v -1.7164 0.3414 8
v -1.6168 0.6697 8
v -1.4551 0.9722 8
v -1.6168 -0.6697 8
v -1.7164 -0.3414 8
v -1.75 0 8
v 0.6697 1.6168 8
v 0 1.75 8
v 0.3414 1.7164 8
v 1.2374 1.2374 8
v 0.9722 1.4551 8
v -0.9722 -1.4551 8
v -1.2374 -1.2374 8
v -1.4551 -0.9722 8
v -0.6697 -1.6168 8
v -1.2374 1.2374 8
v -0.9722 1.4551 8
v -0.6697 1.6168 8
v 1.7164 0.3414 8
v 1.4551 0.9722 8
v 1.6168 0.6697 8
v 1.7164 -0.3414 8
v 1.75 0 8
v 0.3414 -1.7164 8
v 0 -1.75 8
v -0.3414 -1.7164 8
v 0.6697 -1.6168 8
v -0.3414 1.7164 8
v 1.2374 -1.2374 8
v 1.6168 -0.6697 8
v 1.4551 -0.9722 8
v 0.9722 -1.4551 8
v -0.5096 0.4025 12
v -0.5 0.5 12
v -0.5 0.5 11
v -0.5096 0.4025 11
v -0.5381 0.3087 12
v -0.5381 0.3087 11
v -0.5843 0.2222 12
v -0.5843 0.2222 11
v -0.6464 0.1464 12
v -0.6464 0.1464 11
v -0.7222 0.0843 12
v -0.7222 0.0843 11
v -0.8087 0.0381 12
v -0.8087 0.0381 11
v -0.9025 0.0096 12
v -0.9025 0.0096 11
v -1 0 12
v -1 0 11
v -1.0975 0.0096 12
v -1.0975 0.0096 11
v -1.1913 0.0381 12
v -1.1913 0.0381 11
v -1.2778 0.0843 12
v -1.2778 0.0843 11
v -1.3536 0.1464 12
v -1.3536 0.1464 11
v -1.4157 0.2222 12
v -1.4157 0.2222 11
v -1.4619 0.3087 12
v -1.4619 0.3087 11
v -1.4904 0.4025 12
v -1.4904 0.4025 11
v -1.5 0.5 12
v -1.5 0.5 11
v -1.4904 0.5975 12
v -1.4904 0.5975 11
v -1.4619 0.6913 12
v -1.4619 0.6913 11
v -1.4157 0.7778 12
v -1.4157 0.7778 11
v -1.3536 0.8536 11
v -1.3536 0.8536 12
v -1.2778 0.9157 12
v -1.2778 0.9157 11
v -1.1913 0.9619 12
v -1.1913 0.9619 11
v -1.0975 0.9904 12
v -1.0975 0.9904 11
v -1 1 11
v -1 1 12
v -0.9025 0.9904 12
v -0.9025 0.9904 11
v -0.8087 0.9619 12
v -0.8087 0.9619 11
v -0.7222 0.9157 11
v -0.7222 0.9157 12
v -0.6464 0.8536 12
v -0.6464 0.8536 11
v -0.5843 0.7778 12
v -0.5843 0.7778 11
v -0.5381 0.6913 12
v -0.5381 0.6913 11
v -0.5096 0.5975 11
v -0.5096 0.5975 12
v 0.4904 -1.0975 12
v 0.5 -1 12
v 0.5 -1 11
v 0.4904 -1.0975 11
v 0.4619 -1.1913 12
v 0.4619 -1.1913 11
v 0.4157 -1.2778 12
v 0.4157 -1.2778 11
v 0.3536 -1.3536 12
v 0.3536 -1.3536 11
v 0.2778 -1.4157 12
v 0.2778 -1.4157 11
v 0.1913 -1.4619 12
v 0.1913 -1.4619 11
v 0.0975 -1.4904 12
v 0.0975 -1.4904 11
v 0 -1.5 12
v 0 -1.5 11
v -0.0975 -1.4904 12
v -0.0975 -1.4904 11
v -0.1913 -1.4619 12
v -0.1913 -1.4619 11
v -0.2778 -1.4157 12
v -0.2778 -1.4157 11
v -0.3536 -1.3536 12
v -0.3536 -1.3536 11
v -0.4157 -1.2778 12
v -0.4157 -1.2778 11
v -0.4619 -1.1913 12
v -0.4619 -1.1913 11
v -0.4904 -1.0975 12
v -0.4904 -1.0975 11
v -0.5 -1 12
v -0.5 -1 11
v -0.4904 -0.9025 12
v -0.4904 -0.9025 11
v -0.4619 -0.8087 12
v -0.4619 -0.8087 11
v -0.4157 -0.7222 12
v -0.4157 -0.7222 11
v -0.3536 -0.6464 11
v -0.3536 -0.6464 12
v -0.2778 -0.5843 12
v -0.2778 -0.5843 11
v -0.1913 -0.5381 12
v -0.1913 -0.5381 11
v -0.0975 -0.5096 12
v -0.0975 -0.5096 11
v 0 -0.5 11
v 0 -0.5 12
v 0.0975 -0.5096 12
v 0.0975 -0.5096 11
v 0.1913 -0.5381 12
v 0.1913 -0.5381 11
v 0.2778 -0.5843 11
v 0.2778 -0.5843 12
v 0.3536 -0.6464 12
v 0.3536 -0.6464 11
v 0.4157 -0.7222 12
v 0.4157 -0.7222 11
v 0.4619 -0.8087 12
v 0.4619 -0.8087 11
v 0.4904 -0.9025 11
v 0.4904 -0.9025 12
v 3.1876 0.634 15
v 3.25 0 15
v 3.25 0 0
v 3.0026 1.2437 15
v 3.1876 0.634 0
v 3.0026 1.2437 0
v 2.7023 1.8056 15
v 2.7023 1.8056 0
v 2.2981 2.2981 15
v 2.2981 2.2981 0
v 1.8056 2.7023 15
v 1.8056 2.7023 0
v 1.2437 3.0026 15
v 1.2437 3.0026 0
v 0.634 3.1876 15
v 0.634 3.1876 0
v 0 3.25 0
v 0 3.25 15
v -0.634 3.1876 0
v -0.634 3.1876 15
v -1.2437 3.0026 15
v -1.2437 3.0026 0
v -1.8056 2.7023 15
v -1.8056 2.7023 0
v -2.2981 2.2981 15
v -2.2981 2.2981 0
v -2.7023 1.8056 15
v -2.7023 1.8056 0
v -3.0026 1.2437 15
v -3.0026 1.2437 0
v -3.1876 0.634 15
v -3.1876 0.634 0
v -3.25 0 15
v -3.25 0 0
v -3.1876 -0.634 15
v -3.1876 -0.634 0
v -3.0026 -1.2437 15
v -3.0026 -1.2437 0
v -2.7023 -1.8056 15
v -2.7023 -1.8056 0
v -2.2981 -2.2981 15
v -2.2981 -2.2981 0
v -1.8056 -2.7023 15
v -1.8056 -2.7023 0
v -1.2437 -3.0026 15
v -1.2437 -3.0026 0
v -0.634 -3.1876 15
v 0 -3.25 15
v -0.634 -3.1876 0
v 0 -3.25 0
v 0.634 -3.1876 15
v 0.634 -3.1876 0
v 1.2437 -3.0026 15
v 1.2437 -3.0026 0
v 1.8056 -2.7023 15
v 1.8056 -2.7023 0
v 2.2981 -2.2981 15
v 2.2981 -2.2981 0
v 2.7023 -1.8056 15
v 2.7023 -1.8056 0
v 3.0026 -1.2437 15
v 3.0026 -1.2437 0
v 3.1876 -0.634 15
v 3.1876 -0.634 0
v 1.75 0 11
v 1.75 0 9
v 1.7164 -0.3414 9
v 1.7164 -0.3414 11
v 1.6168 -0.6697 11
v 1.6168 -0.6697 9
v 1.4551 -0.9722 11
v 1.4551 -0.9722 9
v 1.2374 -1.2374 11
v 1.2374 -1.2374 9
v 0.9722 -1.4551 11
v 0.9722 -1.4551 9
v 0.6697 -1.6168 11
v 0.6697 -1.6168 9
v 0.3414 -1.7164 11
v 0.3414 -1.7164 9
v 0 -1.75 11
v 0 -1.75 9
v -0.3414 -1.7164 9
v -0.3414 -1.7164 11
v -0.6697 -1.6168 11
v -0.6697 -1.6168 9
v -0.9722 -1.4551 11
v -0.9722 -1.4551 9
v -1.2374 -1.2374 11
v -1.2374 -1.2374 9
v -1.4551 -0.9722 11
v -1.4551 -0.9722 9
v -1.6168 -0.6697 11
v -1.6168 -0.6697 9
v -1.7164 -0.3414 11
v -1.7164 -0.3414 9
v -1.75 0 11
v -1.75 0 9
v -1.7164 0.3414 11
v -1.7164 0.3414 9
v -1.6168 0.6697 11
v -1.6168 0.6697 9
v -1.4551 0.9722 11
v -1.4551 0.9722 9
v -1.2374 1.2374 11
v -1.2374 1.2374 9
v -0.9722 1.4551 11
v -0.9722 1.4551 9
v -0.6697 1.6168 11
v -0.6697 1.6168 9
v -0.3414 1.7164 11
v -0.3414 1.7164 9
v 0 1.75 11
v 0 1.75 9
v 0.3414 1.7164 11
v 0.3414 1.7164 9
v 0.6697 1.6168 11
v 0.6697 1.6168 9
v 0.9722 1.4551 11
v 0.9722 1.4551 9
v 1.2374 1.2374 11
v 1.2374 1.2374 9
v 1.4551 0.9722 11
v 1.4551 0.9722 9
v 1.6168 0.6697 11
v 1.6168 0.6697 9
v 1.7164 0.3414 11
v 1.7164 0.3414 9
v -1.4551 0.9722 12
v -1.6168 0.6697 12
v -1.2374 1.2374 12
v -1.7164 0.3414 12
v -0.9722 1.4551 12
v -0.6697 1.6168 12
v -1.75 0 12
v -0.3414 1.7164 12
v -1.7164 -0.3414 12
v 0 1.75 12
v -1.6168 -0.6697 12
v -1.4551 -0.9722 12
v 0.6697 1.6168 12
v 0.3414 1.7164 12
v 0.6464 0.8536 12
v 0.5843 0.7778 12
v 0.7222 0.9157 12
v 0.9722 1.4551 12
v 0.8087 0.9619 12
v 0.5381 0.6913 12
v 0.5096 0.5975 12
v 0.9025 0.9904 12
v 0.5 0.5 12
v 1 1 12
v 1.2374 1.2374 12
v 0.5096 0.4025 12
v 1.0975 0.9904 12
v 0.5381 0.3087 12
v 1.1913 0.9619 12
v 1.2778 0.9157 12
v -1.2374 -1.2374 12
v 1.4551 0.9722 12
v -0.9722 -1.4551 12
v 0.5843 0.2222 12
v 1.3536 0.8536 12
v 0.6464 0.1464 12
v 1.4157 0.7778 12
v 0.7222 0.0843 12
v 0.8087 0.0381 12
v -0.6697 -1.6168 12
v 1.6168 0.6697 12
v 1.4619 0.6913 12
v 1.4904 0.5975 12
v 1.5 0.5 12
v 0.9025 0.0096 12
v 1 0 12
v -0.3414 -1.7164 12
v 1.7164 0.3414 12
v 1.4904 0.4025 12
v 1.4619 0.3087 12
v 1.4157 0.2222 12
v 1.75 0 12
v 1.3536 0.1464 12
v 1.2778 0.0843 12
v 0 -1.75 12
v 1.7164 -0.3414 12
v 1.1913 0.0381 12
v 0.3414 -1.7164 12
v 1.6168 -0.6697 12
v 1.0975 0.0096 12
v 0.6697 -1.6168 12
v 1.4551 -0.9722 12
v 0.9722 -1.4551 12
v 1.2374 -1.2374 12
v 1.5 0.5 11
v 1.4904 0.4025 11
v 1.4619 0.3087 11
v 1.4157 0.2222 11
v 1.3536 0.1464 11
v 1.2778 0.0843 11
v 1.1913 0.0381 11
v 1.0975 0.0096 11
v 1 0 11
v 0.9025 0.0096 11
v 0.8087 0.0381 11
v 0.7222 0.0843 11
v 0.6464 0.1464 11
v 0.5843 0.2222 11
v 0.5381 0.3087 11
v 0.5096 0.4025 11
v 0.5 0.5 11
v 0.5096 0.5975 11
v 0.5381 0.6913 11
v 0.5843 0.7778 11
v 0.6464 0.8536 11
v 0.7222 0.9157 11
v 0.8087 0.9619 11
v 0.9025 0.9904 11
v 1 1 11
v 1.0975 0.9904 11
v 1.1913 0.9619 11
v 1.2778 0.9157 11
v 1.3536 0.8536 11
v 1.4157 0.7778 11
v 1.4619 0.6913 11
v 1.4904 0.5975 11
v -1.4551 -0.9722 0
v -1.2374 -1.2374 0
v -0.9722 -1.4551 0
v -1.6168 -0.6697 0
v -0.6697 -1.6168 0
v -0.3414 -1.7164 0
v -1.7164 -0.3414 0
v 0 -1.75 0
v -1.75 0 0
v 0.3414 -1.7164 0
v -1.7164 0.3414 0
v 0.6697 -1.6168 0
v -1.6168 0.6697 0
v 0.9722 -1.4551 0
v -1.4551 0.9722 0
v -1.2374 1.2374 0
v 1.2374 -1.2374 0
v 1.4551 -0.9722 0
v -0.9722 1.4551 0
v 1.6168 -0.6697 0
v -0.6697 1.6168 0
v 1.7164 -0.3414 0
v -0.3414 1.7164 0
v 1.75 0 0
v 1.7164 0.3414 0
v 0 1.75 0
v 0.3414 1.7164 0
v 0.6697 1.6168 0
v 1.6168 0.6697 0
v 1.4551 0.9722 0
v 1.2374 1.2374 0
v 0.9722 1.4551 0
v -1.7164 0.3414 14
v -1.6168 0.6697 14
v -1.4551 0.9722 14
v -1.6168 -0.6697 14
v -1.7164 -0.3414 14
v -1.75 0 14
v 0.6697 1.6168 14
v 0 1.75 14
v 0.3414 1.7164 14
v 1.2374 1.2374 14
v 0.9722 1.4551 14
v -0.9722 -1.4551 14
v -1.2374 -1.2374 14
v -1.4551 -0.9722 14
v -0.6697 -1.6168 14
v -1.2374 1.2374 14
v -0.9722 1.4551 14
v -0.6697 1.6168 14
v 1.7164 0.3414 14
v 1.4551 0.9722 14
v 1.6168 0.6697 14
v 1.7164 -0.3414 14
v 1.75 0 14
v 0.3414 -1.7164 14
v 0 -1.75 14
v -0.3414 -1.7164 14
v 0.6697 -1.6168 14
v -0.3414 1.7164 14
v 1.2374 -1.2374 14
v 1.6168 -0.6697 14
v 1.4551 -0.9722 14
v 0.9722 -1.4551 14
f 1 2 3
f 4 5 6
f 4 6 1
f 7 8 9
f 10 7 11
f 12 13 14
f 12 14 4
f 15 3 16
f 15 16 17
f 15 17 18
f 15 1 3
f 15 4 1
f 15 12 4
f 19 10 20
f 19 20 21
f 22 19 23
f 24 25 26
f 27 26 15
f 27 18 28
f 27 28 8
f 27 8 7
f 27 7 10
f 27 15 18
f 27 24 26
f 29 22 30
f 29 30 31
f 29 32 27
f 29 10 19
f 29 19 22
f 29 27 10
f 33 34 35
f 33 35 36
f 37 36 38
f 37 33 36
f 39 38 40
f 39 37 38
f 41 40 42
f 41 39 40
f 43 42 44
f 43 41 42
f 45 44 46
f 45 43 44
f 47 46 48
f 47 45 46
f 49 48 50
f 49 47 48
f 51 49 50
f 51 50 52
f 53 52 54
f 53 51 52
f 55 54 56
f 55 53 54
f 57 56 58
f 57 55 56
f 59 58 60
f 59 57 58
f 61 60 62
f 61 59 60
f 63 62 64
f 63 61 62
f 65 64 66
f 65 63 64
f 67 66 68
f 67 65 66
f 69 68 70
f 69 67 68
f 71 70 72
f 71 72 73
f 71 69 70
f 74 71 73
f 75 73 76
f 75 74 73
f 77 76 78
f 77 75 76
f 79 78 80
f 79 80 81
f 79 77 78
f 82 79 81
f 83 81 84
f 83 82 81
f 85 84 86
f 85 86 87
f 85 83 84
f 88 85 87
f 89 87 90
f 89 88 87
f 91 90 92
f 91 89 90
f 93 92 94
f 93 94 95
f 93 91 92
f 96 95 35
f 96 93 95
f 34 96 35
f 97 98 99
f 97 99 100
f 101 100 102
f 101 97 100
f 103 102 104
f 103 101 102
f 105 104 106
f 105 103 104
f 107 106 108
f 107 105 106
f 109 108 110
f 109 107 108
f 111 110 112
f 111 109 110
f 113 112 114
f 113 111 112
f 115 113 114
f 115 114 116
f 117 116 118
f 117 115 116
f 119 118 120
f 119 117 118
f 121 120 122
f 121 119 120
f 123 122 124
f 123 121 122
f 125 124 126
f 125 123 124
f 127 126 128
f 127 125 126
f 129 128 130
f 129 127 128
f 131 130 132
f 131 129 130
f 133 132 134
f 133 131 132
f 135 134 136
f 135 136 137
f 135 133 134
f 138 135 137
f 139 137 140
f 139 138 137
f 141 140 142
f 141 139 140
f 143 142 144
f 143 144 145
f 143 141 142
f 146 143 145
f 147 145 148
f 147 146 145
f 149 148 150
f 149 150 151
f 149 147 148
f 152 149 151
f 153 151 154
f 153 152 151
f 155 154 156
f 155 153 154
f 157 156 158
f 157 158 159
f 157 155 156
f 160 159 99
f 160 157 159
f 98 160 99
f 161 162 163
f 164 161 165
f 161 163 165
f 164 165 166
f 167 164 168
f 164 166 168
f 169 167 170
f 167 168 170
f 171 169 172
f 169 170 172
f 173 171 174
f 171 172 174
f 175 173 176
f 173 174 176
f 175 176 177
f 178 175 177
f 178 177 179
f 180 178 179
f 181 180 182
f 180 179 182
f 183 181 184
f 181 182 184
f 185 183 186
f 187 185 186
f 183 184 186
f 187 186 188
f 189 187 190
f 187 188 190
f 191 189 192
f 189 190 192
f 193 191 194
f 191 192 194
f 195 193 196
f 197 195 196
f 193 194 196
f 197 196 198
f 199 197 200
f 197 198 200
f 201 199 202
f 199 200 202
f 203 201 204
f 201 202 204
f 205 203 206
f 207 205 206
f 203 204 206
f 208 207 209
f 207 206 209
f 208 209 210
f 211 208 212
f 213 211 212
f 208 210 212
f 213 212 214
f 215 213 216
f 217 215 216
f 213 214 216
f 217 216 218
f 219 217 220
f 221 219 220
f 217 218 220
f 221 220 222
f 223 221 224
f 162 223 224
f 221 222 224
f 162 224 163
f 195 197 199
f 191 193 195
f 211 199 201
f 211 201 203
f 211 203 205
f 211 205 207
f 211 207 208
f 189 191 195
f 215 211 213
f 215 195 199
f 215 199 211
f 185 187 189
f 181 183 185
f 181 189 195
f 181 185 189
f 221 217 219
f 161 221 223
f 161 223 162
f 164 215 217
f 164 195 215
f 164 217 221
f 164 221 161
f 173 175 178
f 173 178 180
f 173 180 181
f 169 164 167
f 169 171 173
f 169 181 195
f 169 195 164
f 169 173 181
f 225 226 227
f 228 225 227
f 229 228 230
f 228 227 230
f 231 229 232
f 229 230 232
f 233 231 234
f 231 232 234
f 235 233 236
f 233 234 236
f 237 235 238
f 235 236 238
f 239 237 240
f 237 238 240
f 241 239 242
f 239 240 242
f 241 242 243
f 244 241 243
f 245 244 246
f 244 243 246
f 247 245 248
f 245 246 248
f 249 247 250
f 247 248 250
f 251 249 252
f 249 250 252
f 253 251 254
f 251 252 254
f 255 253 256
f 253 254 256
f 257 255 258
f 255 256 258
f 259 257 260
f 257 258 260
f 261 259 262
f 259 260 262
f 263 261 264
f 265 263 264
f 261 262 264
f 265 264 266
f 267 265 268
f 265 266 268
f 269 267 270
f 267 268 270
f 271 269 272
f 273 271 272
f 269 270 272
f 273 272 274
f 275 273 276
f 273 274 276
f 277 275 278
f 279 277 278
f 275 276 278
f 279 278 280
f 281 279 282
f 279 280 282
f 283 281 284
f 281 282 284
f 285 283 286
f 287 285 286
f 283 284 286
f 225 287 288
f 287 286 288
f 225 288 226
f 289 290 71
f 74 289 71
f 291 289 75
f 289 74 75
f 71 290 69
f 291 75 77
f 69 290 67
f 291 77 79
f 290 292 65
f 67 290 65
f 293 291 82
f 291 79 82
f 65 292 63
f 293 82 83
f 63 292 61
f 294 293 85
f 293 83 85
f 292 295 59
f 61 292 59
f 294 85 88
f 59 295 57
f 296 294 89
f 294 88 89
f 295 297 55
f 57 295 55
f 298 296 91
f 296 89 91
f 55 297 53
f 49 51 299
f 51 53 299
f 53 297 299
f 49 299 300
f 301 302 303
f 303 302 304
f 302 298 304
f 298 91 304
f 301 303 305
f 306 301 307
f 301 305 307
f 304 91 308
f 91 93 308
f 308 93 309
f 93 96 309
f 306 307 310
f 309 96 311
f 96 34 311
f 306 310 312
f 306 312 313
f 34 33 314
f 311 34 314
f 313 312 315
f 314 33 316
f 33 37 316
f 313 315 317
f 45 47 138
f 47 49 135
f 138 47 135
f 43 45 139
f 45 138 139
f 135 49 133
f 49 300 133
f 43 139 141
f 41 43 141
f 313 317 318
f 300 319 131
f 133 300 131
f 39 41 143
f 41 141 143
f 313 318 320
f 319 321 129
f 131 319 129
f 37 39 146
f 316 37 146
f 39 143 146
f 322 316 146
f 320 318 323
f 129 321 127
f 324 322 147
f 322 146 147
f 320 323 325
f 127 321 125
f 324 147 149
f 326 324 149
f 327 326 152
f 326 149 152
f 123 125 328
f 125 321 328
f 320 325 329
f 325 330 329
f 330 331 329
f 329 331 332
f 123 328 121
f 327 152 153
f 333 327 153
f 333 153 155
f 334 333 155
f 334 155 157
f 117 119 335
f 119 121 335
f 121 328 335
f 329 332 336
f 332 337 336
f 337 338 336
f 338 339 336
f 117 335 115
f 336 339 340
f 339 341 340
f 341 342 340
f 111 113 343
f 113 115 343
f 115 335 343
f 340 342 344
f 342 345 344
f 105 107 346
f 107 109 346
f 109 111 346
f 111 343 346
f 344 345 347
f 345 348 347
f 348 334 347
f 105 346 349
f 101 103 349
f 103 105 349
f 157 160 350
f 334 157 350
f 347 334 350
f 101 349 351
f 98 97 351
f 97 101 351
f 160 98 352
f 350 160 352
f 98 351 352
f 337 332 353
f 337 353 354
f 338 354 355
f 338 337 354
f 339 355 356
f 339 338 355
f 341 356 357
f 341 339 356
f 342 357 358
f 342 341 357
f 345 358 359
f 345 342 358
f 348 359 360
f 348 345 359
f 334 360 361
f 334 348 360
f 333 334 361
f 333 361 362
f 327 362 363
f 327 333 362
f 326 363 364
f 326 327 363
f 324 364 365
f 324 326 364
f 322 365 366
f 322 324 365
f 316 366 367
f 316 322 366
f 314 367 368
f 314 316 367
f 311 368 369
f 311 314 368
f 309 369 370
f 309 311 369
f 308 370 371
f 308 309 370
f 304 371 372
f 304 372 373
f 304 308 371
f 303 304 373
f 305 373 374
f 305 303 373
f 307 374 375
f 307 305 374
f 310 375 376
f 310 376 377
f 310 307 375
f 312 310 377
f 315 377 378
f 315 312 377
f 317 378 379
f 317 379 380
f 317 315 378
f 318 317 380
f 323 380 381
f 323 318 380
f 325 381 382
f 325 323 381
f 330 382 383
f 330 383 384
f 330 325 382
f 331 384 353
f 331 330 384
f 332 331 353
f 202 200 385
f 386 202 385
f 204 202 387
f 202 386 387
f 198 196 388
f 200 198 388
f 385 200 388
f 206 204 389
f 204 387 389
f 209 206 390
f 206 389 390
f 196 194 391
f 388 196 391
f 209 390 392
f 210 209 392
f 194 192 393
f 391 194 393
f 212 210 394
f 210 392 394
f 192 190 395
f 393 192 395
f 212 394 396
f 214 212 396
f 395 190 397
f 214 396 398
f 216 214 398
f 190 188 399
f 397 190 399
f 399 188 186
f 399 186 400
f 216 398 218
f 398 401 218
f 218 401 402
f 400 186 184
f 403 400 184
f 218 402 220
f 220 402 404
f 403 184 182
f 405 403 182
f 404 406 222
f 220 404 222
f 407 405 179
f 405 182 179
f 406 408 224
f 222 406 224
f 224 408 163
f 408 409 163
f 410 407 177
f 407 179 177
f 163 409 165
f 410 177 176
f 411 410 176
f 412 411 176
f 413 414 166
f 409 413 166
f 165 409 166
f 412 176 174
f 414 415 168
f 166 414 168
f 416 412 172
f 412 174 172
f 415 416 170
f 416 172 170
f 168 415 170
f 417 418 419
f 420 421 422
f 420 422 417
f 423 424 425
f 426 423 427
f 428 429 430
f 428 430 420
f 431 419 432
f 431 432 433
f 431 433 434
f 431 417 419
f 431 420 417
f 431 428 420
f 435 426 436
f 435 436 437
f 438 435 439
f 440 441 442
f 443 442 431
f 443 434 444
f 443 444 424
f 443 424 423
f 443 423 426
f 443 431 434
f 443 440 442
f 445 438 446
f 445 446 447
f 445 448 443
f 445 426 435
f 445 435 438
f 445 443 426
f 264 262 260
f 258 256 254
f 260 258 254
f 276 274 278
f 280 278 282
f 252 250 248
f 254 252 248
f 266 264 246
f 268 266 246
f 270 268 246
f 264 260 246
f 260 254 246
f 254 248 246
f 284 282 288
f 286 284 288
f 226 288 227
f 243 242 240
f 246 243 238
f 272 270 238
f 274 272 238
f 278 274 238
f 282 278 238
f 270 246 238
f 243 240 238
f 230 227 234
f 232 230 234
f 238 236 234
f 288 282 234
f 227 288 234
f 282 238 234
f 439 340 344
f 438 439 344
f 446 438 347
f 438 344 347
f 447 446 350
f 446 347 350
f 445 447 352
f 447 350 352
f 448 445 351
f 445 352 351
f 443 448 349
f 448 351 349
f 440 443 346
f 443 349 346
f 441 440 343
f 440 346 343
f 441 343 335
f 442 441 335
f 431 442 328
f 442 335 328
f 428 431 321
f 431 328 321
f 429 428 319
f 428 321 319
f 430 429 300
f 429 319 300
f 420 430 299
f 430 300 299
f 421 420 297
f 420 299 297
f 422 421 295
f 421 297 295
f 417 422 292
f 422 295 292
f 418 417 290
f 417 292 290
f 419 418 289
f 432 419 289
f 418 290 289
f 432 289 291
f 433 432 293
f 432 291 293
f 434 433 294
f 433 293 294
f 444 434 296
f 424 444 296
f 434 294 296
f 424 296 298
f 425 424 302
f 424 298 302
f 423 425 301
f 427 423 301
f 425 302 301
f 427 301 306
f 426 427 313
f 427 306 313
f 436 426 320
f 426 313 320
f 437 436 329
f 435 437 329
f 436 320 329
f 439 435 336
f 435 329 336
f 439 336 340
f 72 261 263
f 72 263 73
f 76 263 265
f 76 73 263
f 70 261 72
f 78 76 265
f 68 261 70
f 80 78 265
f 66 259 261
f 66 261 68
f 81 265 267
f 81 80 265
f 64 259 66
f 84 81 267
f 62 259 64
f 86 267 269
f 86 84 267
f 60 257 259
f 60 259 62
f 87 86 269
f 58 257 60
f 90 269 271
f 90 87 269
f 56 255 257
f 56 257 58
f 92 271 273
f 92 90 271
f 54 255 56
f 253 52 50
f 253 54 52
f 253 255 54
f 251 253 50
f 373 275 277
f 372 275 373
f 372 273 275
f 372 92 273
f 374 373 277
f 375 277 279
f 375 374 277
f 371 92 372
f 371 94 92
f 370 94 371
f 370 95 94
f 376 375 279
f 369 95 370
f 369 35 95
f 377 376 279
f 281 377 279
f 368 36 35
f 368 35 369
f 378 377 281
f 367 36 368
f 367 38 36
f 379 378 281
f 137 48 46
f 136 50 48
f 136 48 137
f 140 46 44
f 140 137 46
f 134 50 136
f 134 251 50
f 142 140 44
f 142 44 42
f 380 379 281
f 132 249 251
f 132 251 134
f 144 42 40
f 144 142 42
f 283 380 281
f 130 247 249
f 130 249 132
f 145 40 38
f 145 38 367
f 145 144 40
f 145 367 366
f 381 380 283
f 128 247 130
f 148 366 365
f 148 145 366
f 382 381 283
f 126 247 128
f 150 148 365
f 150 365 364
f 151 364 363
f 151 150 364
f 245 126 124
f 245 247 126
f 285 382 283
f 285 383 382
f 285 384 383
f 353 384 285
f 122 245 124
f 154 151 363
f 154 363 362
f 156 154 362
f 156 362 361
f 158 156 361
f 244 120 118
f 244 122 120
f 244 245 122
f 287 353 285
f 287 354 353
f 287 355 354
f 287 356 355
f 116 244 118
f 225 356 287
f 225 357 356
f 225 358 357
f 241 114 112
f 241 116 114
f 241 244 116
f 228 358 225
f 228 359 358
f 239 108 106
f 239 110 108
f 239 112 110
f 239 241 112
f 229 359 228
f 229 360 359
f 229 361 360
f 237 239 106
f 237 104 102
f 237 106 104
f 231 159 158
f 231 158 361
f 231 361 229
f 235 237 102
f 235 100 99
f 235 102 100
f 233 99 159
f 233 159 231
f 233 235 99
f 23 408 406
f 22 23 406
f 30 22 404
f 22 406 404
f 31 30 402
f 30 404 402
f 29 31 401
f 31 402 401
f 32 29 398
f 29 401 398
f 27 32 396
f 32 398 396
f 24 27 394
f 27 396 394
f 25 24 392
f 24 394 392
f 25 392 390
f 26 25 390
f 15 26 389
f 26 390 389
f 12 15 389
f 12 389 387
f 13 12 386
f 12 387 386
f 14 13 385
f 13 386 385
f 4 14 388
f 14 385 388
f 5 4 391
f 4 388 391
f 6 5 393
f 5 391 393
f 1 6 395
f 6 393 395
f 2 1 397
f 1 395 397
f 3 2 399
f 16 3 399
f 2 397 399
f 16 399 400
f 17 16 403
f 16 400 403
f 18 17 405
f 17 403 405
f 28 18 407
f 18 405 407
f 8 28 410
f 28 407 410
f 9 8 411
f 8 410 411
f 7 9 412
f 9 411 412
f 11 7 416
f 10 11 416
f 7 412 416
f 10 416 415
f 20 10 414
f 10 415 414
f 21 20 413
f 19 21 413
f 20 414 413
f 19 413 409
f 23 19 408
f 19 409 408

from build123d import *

# Parameters (mm, degrees)
F0_R      = 3.25
F1_DEPTH  = 15
F2_R      = 1.75
F3_DEPTH  = 8
F5_R      = 1.75
F6_DEPTH  = 2
F8_R      = 1.75
F9_DEPTH  = 2
F10_R     = 0.5
F11_DEPTH = 1


with BuildPart() as f1:
    # F0 (on Top) → F1 (new body)
    with BuildSketch(Plane.XY):
        Circle(F0_R)
    extrude(amount=F1_DEPTH)

    # F2 (on face) → F3 (cut)
    with BuildSketch(Plane(origin=(0, 0, 0), x_dir=(1, 0, 0), z_dir=(0, 0, -1))):
        Circle(F2_R)
    extrude(amount=-F3_DEPTH, mode=Mode.SUBTRACT)

    # F5 (on offset) → F6 (cut)
    with BuildSketch(Plane(origin=(0, 0, 9), x_dir=(1, 0, 0), z_dir=(0, 0, -1))):
        Circle(F5_R)
    extrude(amount=-F6_DEPTH, mode=Mode.SUBTRACT)

    # F8 (on offset) → F9 (cut)
    with BuildSketch(Plane(origin=(0, 0, 12), x_dir=(1, 0, 0), z_dir=(0, 0, -1))):
        Circle(F8_R)
    extrude(amount=-F9_DEPTH, mode=Mode.SUBTRACT)

    # F10 (on offset) → F11 (cut)
    with BuildSketch(Plane(origin=(0, 0, 12), x_dir=(1, 0, 0), z_dir=(0, 0, -1))):
        with Locations((-1, -0.5)):
            Circle(F10_R)
        with Locations((1, -0.5)):
            Circle(F10_R)
        with Locations((0, 1)):
            Circle(F10_R)
    extrude(amount=F11_DEPTH, mode=Mode.SUBTRACT)


solid = f1.part
